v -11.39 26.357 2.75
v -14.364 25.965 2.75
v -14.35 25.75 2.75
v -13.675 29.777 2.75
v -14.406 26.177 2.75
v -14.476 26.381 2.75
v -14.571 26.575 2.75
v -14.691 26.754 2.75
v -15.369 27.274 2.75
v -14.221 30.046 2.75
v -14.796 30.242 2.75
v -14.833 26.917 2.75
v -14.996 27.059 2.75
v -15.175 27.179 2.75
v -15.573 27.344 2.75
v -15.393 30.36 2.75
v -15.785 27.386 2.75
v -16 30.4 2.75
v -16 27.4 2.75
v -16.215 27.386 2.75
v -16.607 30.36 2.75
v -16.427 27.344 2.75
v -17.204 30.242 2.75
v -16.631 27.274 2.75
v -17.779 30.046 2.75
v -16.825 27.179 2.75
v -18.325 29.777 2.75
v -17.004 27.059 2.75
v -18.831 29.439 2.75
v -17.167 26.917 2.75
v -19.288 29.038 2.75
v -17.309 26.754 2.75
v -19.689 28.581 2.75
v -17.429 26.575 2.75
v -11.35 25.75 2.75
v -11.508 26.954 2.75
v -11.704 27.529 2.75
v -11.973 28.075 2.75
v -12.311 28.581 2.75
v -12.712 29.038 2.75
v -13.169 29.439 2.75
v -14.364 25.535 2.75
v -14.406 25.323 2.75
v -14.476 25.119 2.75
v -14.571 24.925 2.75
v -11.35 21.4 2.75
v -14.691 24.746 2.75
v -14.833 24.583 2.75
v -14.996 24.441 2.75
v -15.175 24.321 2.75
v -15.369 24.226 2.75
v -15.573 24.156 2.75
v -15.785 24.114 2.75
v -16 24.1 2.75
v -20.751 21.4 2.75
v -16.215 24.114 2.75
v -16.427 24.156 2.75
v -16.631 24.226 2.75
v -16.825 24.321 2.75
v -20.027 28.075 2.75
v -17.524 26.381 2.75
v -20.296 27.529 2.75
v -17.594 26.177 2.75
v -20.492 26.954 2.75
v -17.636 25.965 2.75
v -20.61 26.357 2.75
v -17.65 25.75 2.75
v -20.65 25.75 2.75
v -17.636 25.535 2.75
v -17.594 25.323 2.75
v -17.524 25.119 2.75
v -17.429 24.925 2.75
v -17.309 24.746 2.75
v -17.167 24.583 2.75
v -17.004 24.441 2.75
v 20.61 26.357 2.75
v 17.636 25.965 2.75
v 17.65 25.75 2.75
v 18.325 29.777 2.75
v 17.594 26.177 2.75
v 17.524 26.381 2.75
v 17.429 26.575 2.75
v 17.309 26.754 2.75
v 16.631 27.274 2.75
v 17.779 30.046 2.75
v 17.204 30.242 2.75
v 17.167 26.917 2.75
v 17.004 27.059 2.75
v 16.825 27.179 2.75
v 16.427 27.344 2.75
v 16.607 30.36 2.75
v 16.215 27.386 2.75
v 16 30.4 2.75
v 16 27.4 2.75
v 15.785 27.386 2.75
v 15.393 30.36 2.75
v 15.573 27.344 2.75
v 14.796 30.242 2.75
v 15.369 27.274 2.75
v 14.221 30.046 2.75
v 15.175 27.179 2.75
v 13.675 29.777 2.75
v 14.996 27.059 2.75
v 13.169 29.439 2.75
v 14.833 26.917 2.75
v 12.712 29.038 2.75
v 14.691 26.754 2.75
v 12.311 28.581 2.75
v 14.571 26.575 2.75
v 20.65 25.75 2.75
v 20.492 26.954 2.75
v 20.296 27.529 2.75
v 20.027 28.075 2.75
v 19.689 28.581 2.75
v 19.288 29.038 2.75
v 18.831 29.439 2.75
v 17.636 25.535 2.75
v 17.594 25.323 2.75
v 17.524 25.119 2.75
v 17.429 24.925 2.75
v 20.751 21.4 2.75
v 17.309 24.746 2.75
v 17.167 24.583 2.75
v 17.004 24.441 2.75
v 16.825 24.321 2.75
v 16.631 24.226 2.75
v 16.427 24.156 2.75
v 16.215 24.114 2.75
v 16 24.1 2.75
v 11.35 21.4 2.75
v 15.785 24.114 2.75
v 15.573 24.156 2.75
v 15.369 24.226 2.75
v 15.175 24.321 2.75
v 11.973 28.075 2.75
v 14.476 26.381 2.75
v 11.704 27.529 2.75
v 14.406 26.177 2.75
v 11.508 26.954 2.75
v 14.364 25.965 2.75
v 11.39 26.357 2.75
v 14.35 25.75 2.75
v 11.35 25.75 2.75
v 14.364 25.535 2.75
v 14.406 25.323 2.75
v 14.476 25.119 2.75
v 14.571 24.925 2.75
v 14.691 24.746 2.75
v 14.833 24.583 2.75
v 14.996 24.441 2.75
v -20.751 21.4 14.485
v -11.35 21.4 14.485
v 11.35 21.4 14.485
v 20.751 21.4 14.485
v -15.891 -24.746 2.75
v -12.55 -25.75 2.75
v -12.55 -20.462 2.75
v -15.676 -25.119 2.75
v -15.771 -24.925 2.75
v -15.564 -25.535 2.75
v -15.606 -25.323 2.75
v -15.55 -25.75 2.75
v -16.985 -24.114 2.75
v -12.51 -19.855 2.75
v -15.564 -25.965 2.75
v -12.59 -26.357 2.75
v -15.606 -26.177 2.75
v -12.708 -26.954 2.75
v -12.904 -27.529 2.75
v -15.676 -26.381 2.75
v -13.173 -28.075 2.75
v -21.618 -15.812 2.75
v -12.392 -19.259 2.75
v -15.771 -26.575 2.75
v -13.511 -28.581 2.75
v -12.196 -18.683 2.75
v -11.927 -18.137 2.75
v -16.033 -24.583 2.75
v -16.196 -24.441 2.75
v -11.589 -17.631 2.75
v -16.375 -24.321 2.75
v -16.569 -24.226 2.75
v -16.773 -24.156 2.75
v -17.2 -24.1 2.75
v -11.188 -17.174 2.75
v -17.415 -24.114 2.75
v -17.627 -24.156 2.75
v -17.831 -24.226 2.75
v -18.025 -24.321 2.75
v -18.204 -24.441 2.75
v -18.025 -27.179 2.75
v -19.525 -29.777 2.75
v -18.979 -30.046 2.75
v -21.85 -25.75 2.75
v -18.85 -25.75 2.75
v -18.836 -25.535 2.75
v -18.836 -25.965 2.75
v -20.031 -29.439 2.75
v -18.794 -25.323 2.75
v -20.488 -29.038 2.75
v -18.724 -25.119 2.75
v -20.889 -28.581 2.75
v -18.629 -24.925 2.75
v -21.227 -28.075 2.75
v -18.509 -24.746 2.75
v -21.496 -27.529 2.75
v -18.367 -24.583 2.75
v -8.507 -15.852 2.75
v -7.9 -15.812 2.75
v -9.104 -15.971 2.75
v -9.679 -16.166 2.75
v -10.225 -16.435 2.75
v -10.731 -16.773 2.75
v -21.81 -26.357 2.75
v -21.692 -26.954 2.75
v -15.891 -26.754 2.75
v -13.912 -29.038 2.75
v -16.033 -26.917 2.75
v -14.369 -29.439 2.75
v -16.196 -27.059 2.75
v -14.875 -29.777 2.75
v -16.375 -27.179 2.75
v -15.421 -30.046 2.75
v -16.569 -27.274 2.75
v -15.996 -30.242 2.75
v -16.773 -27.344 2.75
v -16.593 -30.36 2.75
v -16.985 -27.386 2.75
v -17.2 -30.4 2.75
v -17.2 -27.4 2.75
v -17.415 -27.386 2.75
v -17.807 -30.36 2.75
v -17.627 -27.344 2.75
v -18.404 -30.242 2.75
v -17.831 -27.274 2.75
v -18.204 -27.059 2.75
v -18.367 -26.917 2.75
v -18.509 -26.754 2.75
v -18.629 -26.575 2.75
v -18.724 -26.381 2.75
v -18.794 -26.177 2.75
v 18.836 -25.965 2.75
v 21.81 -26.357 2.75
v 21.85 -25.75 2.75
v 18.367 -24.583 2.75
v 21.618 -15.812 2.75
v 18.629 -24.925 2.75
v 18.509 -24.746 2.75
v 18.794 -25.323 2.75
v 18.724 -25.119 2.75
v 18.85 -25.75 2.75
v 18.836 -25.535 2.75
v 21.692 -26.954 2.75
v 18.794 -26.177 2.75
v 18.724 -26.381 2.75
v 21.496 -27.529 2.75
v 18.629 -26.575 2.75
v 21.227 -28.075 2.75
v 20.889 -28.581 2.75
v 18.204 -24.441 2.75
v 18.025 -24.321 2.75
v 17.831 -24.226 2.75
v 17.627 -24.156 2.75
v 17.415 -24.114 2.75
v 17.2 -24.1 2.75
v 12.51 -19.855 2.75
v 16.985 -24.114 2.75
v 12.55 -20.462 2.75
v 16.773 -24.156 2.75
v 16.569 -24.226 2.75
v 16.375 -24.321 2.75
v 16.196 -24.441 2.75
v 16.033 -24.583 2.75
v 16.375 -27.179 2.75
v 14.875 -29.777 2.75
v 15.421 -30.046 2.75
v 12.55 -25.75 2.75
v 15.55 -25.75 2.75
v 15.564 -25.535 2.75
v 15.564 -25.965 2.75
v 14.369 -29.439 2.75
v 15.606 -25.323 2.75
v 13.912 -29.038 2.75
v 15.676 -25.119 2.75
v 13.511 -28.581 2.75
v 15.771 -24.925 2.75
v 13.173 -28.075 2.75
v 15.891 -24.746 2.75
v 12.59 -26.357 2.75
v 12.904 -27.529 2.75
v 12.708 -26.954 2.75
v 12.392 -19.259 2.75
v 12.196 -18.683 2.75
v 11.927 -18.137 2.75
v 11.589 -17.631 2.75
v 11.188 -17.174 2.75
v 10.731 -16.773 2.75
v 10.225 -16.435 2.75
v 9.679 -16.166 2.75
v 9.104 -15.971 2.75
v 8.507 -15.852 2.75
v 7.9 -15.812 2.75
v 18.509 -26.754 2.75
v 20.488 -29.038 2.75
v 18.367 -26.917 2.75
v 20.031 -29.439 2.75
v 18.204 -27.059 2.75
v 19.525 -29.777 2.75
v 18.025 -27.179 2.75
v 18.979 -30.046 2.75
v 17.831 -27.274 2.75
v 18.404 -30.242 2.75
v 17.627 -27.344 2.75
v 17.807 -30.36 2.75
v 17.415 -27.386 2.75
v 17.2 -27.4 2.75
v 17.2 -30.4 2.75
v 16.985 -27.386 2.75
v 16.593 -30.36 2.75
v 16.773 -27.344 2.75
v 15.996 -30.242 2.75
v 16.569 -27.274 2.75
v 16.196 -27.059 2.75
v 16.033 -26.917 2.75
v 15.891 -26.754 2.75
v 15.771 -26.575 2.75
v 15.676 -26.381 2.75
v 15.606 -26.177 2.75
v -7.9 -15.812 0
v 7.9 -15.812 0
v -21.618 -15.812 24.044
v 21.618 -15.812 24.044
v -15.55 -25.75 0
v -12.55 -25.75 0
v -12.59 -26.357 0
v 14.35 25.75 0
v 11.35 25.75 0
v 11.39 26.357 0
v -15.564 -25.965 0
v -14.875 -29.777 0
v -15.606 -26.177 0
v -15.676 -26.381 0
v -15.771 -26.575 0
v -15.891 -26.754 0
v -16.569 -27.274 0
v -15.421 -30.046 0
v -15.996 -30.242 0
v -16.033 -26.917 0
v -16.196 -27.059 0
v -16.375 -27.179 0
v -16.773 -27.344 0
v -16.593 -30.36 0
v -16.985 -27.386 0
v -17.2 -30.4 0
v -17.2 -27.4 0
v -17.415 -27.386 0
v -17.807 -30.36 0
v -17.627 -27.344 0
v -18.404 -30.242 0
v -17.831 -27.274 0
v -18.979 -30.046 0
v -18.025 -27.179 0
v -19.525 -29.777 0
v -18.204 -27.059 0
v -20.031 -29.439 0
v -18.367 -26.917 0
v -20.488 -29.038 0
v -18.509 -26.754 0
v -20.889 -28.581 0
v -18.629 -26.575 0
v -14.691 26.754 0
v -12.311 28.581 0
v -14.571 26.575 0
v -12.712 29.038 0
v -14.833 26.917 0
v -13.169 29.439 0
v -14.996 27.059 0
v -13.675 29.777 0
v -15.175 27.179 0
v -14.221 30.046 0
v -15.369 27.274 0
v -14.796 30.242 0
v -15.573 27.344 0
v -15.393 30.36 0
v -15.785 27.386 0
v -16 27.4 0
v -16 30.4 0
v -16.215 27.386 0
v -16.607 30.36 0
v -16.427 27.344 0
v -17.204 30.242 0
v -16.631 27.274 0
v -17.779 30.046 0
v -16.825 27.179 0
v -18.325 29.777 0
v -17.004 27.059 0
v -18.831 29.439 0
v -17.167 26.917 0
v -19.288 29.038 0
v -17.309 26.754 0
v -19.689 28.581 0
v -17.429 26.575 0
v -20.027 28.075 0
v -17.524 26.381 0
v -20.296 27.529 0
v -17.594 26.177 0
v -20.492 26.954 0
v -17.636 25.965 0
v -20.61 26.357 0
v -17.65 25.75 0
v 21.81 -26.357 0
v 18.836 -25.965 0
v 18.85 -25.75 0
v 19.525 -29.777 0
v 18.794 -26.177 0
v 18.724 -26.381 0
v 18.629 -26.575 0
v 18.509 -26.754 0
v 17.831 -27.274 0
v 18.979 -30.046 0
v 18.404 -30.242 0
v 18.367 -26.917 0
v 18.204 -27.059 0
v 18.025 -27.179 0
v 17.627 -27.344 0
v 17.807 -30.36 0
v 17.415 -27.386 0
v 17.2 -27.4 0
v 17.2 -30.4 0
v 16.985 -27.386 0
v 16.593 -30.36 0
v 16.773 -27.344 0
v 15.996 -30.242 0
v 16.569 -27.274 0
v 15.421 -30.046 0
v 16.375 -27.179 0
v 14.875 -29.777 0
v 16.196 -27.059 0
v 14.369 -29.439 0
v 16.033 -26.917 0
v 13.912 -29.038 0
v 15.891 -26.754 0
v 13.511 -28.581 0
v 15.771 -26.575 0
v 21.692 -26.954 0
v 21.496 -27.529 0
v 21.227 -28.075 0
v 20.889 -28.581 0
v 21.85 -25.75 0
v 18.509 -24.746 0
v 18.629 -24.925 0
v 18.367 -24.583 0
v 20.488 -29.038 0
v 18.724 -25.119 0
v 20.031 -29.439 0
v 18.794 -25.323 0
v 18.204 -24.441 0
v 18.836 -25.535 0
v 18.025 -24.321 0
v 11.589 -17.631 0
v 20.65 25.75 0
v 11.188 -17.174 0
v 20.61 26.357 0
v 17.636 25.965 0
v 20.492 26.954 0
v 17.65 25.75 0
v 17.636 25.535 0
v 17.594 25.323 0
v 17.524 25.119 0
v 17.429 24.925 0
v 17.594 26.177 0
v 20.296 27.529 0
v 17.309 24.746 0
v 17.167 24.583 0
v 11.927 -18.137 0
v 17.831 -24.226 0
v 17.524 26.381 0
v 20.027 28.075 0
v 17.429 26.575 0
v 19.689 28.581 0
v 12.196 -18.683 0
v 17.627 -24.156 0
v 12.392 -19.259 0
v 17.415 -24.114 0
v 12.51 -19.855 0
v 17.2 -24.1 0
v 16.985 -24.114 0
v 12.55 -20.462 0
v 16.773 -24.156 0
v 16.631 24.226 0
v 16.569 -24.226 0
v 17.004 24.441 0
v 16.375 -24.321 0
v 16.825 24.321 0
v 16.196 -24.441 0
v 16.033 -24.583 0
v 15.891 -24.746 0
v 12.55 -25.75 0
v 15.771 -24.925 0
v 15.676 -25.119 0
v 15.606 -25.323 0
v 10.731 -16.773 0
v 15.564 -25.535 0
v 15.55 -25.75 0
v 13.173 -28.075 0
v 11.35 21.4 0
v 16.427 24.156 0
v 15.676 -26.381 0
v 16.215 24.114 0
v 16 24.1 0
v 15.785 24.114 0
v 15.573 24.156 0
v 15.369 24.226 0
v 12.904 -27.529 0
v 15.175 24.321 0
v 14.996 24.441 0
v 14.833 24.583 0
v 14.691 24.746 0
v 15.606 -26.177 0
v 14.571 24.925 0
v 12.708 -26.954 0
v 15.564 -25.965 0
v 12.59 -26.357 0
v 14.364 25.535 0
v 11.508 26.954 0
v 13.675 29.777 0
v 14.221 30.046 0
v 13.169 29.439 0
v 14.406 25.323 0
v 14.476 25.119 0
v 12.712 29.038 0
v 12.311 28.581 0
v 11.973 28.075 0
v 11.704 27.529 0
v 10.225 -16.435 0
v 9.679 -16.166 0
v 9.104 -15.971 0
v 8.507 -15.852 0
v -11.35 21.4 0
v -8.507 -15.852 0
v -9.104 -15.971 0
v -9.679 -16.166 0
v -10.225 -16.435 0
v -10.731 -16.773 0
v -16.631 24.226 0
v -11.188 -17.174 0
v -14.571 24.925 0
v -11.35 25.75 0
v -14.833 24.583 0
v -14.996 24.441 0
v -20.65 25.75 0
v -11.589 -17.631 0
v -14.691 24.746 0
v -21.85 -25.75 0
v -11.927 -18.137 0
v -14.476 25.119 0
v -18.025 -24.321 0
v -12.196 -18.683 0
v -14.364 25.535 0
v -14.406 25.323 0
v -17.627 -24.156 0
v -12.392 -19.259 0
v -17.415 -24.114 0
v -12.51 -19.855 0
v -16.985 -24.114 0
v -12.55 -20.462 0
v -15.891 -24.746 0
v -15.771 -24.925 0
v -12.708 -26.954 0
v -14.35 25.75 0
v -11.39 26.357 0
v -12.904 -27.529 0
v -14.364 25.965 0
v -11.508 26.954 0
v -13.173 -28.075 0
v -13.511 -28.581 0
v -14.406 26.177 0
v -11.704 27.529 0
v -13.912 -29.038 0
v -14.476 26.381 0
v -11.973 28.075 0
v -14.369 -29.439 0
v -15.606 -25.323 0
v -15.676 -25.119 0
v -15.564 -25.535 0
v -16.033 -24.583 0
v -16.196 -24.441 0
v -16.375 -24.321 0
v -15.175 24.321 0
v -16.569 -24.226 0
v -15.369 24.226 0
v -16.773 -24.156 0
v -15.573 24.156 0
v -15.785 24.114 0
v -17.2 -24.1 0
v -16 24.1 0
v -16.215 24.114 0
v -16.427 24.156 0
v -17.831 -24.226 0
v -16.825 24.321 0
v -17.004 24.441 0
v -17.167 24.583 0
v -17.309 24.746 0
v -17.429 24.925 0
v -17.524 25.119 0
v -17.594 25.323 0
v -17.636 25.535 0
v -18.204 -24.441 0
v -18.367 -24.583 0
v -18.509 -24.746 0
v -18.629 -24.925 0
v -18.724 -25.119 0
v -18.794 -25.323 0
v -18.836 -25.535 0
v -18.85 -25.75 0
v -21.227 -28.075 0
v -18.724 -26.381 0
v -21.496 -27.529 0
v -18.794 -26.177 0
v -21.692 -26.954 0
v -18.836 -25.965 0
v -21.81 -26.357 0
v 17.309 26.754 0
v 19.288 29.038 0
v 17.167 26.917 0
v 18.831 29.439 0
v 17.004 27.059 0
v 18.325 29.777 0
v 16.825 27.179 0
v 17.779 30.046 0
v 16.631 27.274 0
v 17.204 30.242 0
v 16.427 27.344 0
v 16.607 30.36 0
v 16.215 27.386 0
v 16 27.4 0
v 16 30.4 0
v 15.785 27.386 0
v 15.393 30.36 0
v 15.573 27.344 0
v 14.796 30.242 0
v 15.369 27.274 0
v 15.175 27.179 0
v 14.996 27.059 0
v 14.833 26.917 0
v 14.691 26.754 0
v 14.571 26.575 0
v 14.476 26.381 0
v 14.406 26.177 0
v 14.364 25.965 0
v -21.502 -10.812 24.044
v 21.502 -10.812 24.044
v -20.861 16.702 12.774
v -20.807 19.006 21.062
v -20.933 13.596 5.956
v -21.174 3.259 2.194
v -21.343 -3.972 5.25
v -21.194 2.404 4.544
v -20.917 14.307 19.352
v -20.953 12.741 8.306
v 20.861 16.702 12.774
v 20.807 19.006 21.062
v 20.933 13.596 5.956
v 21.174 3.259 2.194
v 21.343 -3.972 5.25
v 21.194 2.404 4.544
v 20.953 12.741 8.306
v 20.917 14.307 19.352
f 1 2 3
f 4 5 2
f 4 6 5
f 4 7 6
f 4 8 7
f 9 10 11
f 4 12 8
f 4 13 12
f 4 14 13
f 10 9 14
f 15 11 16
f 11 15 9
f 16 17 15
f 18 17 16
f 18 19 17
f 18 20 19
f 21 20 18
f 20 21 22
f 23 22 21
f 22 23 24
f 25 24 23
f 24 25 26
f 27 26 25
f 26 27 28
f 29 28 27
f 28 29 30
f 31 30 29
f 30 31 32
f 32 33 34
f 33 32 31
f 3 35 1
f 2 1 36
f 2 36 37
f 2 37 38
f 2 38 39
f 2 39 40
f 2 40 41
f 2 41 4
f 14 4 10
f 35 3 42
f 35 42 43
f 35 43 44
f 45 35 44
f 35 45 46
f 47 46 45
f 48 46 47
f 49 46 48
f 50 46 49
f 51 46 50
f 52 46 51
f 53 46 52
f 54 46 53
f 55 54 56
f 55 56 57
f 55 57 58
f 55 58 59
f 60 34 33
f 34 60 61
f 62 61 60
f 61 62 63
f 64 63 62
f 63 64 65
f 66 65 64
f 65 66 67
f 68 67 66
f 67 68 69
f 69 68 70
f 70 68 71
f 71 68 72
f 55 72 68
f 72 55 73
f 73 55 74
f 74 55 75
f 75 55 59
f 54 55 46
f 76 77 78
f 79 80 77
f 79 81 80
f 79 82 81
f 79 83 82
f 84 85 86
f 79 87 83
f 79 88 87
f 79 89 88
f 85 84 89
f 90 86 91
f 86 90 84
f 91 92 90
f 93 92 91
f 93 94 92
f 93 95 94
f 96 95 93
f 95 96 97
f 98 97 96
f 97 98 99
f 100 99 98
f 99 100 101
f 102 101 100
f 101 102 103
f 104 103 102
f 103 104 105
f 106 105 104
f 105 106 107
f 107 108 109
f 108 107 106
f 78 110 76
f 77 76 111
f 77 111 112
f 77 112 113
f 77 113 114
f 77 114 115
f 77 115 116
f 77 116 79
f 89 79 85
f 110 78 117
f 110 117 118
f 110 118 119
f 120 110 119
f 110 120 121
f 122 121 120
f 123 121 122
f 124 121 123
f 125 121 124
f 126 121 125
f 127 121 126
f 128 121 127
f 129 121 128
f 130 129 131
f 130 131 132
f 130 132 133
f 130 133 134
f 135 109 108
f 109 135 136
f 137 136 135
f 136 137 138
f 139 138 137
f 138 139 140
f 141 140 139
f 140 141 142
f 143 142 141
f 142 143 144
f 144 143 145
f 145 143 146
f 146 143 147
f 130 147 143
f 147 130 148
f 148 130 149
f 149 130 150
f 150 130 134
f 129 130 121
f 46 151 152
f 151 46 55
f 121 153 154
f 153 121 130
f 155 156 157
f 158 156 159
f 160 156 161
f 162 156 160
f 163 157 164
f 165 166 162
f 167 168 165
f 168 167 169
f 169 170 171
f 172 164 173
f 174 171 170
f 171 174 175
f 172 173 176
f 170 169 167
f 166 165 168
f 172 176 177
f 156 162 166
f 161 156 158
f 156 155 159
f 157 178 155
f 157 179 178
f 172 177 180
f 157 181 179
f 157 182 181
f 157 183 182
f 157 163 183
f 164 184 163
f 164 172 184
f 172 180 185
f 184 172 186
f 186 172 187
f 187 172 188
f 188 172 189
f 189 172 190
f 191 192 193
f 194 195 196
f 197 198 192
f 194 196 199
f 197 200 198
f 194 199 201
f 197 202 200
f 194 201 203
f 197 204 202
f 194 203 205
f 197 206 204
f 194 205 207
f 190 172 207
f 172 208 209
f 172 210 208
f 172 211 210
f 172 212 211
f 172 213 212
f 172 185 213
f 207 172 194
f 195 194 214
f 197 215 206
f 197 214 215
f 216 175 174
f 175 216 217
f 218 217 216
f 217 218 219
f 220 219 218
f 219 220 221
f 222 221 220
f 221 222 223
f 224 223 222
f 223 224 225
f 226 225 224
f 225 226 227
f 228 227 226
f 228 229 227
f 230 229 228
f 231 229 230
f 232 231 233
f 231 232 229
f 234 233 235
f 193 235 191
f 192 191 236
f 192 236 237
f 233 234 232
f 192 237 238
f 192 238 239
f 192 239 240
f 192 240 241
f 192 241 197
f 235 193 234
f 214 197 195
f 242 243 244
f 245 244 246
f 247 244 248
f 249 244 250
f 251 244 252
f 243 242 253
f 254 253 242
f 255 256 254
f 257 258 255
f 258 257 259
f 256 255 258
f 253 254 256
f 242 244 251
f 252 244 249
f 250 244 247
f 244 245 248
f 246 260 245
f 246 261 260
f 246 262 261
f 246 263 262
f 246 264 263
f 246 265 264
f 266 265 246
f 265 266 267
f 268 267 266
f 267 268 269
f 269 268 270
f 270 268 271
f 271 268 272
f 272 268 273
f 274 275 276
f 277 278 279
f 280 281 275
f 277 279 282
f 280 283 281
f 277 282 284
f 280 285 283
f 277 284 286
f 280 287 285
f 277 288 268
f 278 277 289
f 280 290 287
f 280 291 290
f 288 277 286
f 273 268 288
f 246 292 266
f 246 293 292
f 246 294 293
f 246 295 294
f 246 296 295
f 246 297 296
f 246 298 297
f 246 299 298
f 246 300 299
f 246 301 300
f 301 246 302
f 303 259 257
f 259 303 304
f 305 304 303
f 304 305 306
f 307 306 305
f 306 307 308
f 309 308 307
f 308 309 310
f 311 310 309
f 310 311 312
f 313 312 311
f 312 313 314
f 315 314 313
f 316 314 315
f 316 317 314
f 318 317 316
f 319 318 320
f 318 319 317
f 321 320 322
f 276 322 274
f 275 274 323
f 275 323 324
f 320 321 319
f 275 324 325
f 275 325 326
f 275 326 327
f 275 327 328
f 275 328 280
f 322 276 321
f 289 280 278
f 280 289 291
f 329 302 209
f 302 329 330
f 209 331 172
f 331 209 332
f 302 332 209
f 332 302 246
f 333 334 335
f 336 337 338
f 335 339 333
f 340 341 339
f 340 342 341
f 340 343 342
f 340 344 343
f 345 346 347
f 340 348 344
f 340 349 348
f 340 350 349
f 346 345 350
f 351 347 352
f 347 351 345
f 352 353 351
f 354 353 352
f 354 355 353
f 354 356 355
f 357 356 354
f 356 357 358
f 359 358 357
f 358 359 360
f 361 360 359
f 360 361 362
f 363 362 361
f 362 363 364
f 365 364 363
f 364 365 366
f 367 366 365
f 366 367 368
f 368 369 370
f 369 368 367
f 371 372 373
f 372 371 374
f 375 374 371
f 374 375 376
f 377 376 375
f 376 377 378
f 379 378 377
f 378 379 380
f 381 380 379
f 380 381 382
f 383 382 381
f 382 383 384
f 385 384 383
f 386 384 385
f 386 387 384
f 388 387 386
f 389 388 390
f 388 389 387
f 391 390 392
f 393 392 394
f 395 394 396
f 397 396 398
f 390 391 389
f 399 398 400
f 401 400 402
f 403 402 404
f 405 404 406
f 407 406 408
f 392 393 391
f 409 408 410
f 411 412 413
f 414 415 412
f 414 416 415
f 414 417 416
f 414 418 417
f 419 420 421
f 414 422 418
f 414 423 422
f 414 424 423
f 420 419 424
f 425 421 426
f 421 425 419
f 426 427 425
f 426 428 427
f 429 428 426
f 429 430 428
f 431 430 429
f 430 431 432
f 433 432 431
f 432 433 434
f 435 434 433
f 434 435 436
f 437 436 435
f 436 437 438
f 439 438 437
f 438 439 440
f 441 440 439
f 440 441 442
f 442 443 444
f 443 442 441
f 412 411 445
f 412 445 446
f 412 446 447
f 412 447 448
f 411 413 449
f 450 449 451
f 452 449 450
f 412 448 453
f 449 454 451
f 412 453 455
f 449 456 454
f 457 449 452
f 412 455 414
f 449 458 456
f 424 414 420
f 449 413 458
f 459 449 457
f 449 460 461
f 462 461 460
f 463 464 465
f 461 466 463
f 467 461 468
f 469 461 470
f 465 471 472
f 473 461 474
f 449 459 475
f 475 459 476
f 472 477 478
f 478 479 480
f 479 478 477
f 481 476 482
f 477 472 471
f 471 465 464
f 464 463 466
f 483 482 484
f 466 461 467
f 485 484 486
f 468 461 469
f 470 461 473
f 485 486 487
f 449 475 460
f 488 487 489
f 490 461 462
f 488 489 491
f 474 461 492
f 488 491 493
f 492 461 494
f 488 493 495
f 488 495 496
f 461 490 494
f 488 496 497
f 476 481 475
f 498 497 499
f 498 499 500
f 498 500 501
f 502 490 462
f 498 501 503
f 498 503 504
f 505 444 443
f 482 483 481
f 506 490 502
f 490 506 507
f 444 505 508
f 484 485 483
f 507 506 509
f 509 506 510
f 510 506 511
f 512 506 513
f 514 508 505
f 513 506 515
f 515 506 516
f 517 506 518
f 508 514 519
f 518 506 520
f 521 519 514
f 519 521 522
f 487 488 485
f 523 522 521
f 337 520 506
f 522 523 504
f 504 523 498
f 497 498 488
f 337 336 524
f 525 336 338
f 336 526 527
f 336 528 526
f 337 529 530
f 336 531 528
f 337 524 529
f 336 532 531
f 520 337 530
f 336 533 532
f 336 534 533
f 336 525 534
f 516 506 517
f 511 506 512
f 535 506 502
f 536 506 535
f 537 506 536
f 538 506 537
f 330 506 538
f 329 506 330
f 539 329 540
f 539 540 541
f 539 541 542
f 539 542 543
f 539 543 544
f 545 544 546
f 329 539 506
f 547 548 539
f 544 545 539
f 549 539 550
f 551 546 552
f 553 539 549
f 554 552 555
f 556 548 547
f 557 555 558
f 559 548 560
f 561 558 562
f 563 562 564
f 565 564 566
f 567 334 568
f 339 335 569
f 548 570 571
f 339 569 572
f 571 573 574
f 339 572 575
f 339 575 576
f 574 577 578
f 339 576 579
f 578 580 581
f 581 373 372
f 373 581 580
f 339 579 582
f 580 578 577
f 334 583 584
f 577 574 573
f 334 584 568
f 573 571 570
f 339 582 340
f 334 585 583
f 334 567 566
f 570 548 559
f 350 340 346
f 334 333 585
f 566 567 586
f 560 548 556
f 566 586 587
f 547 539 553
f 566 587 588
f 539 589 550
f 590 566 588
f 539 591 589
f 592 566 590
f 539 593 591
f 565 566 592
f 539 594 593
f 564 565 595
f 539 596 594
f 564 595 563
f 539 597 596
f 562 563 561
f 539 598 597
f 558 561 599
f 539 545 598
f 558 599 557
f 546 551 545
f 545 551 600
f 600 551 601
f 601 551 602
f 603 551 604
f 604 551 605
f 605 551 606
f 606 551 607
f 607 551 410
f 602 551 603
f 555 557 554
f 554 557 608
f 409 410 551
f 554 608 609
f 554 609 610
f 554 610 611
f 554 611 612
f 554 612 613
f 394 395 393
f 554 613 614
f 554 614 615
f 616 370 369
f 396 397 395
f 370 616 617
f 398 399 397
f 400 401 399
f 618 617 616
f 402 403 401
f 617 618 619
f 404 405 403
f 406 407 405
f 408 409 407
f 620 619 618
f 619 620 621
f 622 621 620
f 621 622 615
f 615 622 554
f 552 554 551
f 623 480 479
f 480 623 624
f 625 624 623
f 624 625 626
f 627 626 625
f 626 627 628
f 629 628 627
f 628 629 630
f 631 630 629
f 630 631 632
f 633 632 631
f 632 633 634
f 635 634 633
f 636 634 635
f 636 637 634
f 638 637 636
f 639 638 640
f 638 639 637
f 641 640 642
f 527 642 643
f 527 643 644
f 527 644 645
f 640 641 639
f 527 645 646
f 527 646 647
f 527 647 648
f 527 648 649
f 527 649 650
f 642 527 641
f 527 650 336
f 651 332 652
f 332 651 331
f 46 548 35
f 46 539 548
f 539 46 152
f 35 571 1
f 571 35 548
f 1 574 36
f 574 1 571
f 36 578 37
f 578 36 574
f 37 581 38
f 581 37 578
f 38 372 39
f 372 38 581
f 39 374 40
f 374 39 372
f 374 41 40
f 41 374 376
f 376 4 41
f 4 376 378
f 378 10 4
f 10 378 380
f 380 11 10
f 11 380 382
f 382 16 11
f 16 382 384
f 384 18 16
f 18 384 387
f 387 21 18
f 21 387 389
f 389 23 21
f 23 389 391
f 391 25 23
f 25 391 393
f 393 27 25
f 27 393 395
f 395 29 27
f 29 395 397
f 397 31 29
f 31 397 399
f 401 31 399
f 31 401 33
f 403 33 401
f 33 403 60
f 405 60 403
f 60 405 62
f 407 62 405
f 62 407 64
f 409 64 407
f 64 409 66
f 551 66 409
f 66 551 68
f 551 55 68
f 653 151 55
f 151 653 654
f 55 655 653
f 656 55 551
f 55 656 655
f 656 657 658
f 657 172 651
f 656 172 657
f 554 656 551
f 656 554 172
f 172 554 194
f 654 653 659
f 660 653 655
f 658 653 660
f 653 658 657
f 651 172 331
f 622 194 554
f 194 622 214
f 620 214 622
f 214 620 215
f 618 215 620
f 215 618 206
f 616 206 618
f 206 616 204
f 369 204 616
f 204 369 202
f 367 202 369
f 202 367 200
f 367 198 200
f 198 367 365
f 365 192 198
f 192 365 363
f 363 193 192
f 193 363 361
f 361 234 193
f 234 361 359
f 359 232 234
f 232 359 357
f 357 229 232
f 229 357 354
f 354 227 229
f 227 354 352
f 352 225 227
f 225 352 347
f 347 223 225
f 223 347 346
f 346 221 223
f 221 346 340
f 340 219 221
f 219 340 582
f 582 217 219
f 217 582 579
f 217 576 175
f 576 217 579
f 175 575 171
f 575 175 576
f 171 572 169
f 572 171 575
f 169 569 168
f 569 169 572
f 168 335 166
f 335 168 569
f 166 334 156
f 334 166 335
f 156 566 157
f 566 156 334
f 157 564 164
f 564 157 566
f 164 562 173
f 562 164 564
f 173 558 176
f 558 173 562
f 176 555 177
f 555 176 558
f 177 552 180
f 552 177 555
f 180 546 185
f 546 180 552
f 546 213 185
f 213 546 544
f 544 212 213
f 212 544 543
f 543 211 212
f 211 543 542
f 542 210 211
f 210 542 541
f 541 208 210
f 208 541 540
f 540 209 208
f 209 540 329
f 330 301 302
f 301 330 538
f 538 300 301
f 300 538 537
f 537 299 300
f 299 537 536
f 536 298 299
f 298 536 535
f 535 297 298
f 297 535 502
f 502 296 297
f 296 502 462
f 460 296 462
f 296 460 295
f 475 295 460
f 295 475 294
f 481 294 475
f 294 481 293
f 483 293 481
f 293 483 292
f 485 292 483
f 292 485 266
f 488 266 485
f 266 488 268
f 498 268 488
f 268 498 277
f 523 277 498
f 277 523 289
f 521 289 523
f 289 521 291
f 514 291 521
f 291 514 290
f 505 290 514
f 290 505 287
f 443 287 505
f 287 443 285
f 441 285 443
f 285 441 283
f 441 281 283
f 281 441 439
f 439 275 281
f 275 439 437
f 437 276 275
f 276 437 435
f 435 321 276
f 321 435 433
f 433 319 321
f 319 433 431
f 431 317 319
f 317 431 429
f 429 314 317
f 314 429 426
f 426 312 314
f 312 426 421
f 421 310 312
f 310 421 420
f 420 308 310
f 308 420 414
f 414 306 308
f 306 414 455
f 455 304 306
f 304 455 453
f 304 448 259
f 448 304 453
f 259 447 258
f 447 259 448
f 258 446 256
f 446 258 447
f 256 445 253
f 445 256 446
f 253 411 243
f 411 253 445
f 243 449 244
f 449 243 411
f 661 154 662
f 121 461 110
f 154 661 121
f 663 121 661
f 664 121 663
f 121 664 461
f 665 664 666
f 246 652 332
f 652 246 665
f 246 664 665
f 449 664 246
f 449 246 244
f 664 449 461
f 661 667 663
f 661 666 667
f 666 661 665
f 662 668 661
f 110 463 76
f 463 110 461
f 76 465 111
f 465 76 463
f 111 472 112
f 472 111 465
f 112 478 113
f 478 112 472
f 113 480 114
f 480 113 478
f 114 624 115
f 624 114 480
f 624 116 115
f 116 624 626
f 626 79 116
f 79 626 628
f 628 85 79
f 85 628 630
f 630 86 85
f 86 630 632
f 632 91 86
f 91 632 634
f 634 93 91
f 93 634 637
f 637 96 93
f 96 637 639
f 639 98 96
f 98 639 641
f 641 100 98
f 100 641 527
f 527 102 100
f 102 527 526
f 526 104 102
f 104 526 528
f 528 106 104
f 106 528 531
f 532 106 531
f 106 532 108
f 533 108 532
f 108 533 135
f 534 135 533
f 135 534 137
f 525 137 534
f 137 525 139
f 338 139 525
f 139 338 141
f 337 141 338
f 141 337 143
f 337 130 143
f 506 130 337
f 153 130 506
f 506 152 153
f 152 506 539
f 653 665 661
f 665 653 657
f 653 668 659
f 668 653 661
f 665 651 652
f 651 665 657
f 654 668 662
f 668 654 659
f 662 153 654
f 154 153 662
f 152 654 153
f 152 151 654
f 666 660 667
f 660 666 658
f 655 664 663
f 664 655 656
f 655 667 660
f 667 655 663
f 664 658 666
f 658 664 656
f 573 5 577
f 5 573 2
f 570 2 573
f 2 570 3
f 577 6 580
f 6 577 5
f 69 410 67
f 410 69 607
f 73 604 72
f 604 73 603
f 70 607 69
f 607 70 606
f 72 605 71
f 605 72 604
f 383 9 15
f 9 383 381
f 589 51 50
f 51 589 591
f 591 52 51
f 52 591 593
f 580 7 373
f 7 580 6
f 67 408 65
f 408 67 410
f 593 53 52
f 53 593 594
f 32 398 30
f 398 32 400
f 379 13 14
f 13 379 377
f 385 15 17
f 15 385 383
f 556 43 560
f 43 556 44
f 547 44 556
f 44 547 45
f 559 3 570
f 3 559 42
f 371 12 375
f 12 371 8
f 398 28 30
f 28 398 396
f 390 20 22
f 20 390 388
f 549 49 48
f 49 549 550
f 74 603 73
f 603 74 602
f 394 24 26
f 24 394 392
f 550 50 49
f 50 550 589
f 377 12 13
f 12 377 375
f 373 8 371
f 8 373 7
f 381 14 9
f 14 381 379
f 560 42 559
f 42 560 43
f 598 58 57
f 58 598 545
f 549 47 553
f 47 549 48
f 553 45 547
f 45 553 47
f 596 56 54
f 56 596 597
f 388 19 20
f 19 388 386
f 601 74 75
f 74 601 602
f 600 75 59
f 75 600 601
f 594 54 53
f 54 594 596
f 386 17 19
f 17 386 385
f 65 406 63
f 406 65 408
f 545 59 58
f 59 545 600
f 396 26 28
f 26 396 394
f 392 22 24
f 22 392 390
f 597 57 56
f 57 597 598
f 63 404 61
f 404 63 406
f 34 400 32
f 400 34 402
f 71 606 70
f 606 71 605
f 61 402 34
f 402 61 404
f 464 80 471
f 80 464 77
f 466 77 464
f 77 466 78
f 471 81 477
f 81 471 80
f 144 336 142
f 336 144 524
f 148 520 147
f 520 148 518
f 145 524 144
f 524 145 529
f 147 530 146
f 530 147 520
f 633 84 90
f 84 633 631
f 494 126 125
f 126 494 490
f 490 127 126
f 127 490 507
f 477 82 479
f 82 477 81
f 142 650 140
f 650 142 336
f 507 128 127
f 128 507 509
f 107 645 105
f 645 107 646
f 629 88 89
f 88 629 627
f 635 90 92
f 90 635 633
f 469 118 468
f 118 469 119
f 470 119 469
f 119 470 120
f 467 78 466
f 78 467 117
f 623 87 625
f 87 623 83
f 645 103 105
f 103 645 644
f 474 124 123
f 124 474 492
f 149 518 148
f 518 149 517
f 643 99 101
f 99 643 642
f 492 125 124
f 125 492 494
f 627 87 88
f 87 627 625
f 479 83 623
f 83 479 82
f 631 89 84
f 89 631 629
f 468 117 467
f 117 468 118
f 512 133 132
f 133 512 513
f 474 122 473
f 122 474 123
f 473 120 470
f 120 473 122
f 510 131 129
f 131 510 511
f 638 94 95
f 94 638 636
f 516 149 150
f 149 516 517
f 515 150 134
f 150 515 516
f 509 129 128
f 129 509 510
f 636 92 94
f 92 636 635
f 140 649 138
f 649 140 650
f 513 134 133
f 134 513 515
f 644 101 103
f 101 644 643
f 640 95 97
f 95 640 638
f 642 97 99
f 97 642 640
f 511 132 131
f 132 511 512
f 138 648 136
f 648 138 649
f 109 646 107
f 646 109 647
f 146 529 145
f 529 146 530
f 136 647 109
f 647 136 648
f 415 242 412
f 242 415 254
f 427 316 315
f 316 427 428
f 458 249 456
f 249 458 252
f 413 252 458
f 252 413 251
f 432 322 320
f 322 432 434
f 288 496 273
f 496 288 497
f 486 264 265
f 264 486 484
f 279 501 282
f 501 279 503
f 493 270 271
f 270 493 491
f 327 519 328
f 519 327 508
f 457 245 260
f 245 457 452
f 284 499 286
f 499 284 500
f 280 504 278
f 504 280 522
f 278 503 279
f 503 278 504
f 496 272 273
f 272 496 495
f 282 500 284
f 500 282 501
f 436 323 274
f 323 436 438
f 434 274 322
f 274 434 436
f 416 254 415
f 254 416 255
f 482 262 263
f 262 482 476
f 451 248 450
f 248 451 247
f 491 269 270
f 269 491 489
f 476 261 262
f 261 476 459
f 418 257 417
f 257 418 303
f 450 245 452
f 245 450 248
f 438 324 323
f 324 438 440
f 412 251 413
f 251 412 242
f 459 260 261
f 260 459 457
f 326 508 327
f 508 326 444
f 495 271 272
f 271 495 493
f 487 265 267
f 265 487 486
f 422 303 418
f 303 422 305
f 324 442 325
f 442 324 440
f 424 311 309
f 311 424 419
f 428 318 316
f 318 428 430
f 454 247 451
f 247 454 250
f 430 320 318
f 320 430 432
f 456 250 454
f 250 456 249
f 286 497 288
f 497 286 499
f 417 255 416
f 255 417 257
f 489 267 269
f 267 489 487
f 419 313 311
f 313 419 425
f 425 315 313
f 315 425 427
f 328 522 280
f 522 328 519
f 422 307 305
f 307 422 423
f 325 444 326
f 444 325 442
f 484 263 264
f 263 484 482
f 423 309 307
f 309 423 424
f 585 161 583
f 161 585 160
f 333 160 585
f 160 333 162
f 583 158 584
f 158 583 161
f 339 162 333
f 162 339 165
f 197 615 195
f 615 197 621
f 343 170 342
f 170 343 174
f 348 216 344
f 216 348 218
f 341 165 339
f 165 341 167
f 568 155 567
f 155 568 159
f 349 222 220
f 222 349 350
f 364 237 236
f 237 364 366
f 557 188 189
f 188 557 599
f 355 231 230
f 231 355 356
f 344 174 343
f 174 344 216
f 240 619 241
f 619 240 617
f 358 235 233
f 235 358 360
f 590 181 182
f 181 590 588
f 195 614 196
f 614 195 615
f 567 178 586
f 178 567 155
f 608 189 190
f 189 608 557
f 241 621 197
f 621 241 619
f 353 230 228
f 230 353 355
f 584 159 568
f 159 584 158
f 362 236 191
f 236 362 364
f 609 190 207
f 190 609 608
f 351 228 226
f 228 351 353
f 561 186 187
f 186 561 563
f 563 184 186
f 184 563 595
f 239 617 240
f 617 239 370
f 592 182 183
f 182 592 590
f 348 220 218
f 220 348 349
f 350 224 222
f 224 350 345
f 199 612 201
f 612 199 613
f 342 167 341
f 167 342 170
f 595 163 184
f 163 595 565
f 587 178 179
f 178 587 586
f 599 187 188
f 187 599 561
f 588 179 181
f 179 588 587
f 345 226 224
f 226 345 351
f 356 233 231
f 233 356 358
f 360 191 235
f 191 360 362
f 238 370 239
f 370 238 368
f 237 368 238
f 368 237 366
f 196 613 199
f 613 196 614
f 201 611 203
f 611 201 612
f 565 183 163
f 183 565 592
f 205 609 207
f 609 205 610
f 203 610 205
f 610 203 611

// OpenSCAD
//Depth of camera
camera_depth = 22;
//Height of the supporting back
back_height = 20;
//C/C Distance between front holes
front_cc = 32;
//C/C Distance between rear holes
rear_cc = 34.4;
//C/C Distance between front and rear holes
front_rear_cc = 51.5;
//angle of camera
angle = 20; //[10:45]
//Thickness of the base
base_thickness = 2.75;
//Hole diameter (may need adjustment depending on printer)
hole_size = 3.3;
//Determines the amount of "meat" around the holes
edge_margin = 3;
//Diameter of screw head (to allow enough clerance)
screw_head_size = 6.1;
//Wedge offset from front
front_offset = 9;
//Add lip to fron of wedge
use_lip = "Yes"; //[Yes,No]
//Velcro strap width
velcro_width = 11;
//Velcro strap thickness
velcro_thickness = 2.5;
//antenna holder angle
angle2 = 85;
antDist = 7;


//Calculated variables wont be visible to Thingiverse customizer
hole_clearence = edge_margin+hole_size/2;
screw_head_clerance = screw_head_size / 2;
hole_radius = hole_size / 2;
lip_thickness = use_lip == "Yes" ? 5*1 : 0*1;
lip_height =  use_lip == "Yes" ? 7*1 : 0*1;

//internal global varaibles
_xFrontOffset = front_cc/2;
_xRearOffset = rear_cc/2;
_xTotFrontOffset = front_cc/2+hole_clearence;
_xTotRearOffset = rear_cc/2+hole_clearence;
_yOffset = front_rear_cc/2;
_yTotOffset = front_rear_cc/2+hole_clearence;
_cameraHolderDepth = (lip_thickness+camera_depth)*cos(angle)+back_height*sin(angle)+lip_thickness;
_cameraHolderHeight = back_height*cos(angle) + base_thickness + velcro_thickness;
_wedgeStartYoffset = _yTotOffset - front_offset;
_wedgeEndYoffset = _yTotOffset - front_offset - _cameraHolderDepth;
_rearSpaceLeft = _yTotOffset * 2 - front_offset - _cameraHolderDepth;
_totWidth = front_cc > rear_cc ? front_cc + hole_clearence*2 : rear_cc + hole_clearence*2;
_velcroXpos = (velcro_width + edge_margin) < (front_cc+2*edge_margin+hole_size) / 2 ? 0 :  ((front_cc+2*edge_margin+hole_size) / 2 )-(velcro_width + edge_margin);


/**
 *
 */
module tube(inDia, outDia, height) {
	difference(){
		cylinder(h = height, r = outDia/2, $fn=50);
		translate([0, 0, -0.5]) { cylinder(h = height+1, r = inDia/2, $fn=30); }
	}
}

module createBase()
{   
           
    difference()
    {
        linear_extrude( height = _cameraHolderHeight)
        {
            union()
            {
                if( front_offset > 0 )
                {
                    polygon(
                                points = [  [-_xTotFrontOffset, _yOffset],
                                            [-_xFrontOffset+hole_clearence, _yOffset],
                                            [-_xFrontOffset+hole_clearence, _wedgeStartYoffset],
                                            [_xFrontOffset-hole_clearence, _wedgeStartYoffset],
                                            [_xFrontOffset-hole_clearence, _yOffset],
                                            [_xTotFrontOffset, _yOffset], 
                                            [_xTotRearOffset, -_yOffset], 
                                            [_xRearOffset-hole_clearence, -_yOffset], 
                                            [_xRearOffset-hole_clearence, _wedgeEndYoffset], 
                                            [-_xRearOffset+hole_clearence, _wedgeEndYoffset], 
                                            [-_xRearOffset+hole_clearence, -_yOffset], 
                                            [-_xTotRearOffset, -_yOffset] ], 
                                convexity = 10);
                } else {
                    polygon(
                                points = [  [-_xFrontOffset, _yOffset+hole_clearence],                                        [_xFrontOffset, _yOffset+hole_clearence], 
                                            [_xTotFrontOffset, _yOffset], 
                                            [_xTotRearOffset, -_yOffset], 
                                            [_xRearOffset-hole_clearence, -_yOffset], 
                                            [_xRearOffset-hole_clearence, _wedgeEndYoffset], 
                                            [-_xRearOffset+hole_clearence, _wedgeEndYoffset], 
                                            [-_xRearOffset+hole_clearence, -_yOffset], 
                                            [-_xTotRearOffset, -_yOffset],
                                            [-_xTotFrontOffset, _yOffset]],
                                convexity = 10);
                }
                translate([-_xFrontOffset, _yOffset, 0])
                circle(r=hole_clearence, center = false); 
                translate([_xFrontOffset, _yOffset, 0])
                circle(r=hole_clearence, center = false); 
                translate([_xRearOffset, -_yOffset, 0])
                circle(r=hole_clearence, center = false); 
                translate([-_xRearOffset, -_yOffset, 0])
                circle(r=hole_clearence, center = false); 
                if(front_offset > hole_clearence*2)
                {
                    difference()
                    {
                        union()
                        {
                            translate([_xFrontOffset-hole_clearence*2, _wedgeStartYoffset, 0])
                            square([hole_clearence,hole_clearence]);
                            translate([-_xFrontOffset+hole_clearence, _wedgeStartYoffset, 0])
                            square([hole_clearence,hole_clearence]);
                        }
                        union()
                        {
                            translate([_xFrontOffset-hole_clearence*2, _wedgeStartYoffset+hole_clearence, 0])
                            circle(r=hole_clearence, center = false); 
                            translate([-_xFrontOffset+hole_clearence*2, _wedgeStartYoffset+hole_clearence, 0])                circle(r=hole_clearence, center = false);   
                        }
                    }
                }
                if((_yTotOffset + _wedgeEndYoffset) > hole_clearence*2)
                {
                    difference()
                    {
                        union()
                        {
                            translate([_xRearOffset-hole_clearence*2, _wedgeEndYoffset-hole_clearence, 0])
                            square([hole_clearence,hole_clearence]);
                            translate([-_xRearOffset+hole_clearence, _wedgeEndYoffset-hole_clearence, 0])
                            square([hole_clearence,hole_clearence]);
                            
                        }
                        union()
                        {
                            translate([_xRearOffset-hole_clearence*2, _wedgeEndYoffset-hole_clearence, 0])
                            circle(r=hole_clearence, center = false); 
                            translate([-_xRearOffset+hole_clearence*2, _wedgeEndYoffset-hole_clearence, 0])
                            circle(r=hole_clearence, center = false); 
                        }
                    }
                }
            }
        }
        union()
        {
            translate([-_totWidth/2, _wedgeStartYoffset, base_thickness])
            cube([_totWidth,front_rear_cc,_cameraHolderHeight], center = false);
            rearSpace = _yTotOffset + _wedgeEndYoffset;
            translate([-_totWidth/2, _wedgeEndYoffset-rearSpace, base_thickness])
            cube([_totWidth,rearSpace,_cameraHolderHeight], center = false);
        }
    }    
}

module addWedge()
{
    totWidth = front_cc > rear_cc ? front_cc + edge_margin*2+hole_size: rear_cc + edge_margin*2+hole_size;
                xOffset = totWidth/2;  
    difference()
    {
        difference()
        {
            children();
            union()
            {
                          
                yOffset = (front_rear_cc/2+edge_margin+hole_size/2)-(lip_thickness+camera_depth)*cos(angle) -front_offset;
                translate([-xOffset, yOffset, base_thickness+velcro_thickness])
                rotate([angle,0,0])
                cube([totWidth, camera_depth, back_height+5], center = false);
                
            }
        }
       union()
       {
           yOffset = (front_rear_cc/2+edge_margin+hole_size/2)-lip_thickness*cos(angle) -front_offset; 
                zOffset = base_thickness+velcro_thickness + camera_depth*sin(angle);
                translate([-xOffset, yOffset, zOffset])
                rotate([angle,0,0])
                translate([0, -1, lip_height])
                cube([totWidth, front_rear_cc, back_height+5], center = false);
                translate([-xOffset, yOffset, zOffset])
                rotate([angle,0,0])
                translate([0, lip_thickness, 0])
                cube([totWidth, front_rear_cc, back_height+5], center = false);
       } 
    }
}

module addStrapHole()
{
    difference()
    {
        children();
        union()
        {
            /*
            yOffset = (front_rear_cc/2+edge_margin+hole_size/2)-lip_thickness*cos(angle) -front_offset; 
            zOffset = base_thickness+velcro_thickness + camera_depth*sin(angle);
            translate([0, yOffset, zOffset])
            rotate([angle,0,0])
            translate([_velcroXpos, 0, -zOffset+base_thickness])
            cube([velcro_width, lip_thickness+1, zOffset*2], center = false);
            ySize = camera_depth + base_thickness + velcro_thickness;
            translate([0, yOffset, zOffset])
            rotate([angle,0,0])            
            translate([_velcroXpos, -ySize, -base_thickness-velcro_thickness])
            cube([velcro_width, ySize+1, velcro_thickness], center = false);
            translate([0, yOffset, zOffset])
            rotate([angle,0,0])            
            translate([_velcroXpos, -ySize, -base_thickness-velcro_thickness])            
            cube([velcro_width, velcro_thickness, back_height*1.5], center = false);
            */
            translate([0,8,base_thickness+velcro_thickness]){ 
                rotate([angle,0,0]){
                    cube([_totWidth, velcro_width, velcro_thickness], center = true);
                }
            }
            
        }
    }
}

module clearForScrews()
{
    xOffsetFront = front_cc/2;
    xOffsetRear = rear_cc/2;
    yOffset = front_rear_cc/2;
    
    difference()
    {
        children();
        union()
        {
            //Screw holes
            translate([-xOffsetFront, yOffset, (base_thickness+1)/2])
            cylinder(h=base_thickness+1, r=hole_radius, center = true); 
            translate([xOffsetFront, yOffset, (base_thickness+1)/2])
            cylinder(h=base_thickness+1, r=hole_radius, center = true); 
            translate([xOffsetRear, -yOffset, (base_thickness+1)/2])
            cylinder(h=base_thickness+1, r=hole_radius, center = true); 
            translate([-xOffsetRear, -yOffset, (base_thickness+1)/2])
            cylinder(h=base_thickness+1, r=hole_radius, center = true); 
            translate([xOffsetRear, -yOffset, 50+base_thickness])
            cylinder(h=100, r=screw_head_clerance, center = true);        translate([-xOffsetRear, -yOffset, 50+base_thickness])
            cylinder(h=100, r=screw_head_clerance, center = true);
            translate([-xOffsetFront, yOffset, 50+base_thickness])
            cylinder(h=100, r=screw_head_clerance, center = true);
            translate([xOffsetFront, yOffset, 50+base_thickness])
            cylinder(h=100, r=screw_head_clerance, center = true);
            /*
            for(i=[-1,1]){
            translate([i*antDist/2,-front_rear_cc/2-1,0]) rotate([0,i*angle2/2,0]) cylinder(r=hole_size/2, h=90, $fn=20,center=true);
}
            */
        }
    }
}


$fn = 48;
clearForScrews()
{
    addStrapHole()
    {
        addWedge()
        {
            createBase();
        }
    }
}

/**
//antenna holder
difference(){

for(i=[-1,1]){
translate([i*antDist/2,-front_rear_cc/2-1,0]) rotate([0,i*angle2/2,0]) tube(hole_size, 7.5, 15);
}

translate([0,0,-10/2]) cube(size=[100,100,10], center=true);
for(i=[-1,1]){
translate([i*antDist/2, -front_rear_cc/2-1,10/2+8]) cube(size=[27,10,10], center=true);
}

}//diff
**/
